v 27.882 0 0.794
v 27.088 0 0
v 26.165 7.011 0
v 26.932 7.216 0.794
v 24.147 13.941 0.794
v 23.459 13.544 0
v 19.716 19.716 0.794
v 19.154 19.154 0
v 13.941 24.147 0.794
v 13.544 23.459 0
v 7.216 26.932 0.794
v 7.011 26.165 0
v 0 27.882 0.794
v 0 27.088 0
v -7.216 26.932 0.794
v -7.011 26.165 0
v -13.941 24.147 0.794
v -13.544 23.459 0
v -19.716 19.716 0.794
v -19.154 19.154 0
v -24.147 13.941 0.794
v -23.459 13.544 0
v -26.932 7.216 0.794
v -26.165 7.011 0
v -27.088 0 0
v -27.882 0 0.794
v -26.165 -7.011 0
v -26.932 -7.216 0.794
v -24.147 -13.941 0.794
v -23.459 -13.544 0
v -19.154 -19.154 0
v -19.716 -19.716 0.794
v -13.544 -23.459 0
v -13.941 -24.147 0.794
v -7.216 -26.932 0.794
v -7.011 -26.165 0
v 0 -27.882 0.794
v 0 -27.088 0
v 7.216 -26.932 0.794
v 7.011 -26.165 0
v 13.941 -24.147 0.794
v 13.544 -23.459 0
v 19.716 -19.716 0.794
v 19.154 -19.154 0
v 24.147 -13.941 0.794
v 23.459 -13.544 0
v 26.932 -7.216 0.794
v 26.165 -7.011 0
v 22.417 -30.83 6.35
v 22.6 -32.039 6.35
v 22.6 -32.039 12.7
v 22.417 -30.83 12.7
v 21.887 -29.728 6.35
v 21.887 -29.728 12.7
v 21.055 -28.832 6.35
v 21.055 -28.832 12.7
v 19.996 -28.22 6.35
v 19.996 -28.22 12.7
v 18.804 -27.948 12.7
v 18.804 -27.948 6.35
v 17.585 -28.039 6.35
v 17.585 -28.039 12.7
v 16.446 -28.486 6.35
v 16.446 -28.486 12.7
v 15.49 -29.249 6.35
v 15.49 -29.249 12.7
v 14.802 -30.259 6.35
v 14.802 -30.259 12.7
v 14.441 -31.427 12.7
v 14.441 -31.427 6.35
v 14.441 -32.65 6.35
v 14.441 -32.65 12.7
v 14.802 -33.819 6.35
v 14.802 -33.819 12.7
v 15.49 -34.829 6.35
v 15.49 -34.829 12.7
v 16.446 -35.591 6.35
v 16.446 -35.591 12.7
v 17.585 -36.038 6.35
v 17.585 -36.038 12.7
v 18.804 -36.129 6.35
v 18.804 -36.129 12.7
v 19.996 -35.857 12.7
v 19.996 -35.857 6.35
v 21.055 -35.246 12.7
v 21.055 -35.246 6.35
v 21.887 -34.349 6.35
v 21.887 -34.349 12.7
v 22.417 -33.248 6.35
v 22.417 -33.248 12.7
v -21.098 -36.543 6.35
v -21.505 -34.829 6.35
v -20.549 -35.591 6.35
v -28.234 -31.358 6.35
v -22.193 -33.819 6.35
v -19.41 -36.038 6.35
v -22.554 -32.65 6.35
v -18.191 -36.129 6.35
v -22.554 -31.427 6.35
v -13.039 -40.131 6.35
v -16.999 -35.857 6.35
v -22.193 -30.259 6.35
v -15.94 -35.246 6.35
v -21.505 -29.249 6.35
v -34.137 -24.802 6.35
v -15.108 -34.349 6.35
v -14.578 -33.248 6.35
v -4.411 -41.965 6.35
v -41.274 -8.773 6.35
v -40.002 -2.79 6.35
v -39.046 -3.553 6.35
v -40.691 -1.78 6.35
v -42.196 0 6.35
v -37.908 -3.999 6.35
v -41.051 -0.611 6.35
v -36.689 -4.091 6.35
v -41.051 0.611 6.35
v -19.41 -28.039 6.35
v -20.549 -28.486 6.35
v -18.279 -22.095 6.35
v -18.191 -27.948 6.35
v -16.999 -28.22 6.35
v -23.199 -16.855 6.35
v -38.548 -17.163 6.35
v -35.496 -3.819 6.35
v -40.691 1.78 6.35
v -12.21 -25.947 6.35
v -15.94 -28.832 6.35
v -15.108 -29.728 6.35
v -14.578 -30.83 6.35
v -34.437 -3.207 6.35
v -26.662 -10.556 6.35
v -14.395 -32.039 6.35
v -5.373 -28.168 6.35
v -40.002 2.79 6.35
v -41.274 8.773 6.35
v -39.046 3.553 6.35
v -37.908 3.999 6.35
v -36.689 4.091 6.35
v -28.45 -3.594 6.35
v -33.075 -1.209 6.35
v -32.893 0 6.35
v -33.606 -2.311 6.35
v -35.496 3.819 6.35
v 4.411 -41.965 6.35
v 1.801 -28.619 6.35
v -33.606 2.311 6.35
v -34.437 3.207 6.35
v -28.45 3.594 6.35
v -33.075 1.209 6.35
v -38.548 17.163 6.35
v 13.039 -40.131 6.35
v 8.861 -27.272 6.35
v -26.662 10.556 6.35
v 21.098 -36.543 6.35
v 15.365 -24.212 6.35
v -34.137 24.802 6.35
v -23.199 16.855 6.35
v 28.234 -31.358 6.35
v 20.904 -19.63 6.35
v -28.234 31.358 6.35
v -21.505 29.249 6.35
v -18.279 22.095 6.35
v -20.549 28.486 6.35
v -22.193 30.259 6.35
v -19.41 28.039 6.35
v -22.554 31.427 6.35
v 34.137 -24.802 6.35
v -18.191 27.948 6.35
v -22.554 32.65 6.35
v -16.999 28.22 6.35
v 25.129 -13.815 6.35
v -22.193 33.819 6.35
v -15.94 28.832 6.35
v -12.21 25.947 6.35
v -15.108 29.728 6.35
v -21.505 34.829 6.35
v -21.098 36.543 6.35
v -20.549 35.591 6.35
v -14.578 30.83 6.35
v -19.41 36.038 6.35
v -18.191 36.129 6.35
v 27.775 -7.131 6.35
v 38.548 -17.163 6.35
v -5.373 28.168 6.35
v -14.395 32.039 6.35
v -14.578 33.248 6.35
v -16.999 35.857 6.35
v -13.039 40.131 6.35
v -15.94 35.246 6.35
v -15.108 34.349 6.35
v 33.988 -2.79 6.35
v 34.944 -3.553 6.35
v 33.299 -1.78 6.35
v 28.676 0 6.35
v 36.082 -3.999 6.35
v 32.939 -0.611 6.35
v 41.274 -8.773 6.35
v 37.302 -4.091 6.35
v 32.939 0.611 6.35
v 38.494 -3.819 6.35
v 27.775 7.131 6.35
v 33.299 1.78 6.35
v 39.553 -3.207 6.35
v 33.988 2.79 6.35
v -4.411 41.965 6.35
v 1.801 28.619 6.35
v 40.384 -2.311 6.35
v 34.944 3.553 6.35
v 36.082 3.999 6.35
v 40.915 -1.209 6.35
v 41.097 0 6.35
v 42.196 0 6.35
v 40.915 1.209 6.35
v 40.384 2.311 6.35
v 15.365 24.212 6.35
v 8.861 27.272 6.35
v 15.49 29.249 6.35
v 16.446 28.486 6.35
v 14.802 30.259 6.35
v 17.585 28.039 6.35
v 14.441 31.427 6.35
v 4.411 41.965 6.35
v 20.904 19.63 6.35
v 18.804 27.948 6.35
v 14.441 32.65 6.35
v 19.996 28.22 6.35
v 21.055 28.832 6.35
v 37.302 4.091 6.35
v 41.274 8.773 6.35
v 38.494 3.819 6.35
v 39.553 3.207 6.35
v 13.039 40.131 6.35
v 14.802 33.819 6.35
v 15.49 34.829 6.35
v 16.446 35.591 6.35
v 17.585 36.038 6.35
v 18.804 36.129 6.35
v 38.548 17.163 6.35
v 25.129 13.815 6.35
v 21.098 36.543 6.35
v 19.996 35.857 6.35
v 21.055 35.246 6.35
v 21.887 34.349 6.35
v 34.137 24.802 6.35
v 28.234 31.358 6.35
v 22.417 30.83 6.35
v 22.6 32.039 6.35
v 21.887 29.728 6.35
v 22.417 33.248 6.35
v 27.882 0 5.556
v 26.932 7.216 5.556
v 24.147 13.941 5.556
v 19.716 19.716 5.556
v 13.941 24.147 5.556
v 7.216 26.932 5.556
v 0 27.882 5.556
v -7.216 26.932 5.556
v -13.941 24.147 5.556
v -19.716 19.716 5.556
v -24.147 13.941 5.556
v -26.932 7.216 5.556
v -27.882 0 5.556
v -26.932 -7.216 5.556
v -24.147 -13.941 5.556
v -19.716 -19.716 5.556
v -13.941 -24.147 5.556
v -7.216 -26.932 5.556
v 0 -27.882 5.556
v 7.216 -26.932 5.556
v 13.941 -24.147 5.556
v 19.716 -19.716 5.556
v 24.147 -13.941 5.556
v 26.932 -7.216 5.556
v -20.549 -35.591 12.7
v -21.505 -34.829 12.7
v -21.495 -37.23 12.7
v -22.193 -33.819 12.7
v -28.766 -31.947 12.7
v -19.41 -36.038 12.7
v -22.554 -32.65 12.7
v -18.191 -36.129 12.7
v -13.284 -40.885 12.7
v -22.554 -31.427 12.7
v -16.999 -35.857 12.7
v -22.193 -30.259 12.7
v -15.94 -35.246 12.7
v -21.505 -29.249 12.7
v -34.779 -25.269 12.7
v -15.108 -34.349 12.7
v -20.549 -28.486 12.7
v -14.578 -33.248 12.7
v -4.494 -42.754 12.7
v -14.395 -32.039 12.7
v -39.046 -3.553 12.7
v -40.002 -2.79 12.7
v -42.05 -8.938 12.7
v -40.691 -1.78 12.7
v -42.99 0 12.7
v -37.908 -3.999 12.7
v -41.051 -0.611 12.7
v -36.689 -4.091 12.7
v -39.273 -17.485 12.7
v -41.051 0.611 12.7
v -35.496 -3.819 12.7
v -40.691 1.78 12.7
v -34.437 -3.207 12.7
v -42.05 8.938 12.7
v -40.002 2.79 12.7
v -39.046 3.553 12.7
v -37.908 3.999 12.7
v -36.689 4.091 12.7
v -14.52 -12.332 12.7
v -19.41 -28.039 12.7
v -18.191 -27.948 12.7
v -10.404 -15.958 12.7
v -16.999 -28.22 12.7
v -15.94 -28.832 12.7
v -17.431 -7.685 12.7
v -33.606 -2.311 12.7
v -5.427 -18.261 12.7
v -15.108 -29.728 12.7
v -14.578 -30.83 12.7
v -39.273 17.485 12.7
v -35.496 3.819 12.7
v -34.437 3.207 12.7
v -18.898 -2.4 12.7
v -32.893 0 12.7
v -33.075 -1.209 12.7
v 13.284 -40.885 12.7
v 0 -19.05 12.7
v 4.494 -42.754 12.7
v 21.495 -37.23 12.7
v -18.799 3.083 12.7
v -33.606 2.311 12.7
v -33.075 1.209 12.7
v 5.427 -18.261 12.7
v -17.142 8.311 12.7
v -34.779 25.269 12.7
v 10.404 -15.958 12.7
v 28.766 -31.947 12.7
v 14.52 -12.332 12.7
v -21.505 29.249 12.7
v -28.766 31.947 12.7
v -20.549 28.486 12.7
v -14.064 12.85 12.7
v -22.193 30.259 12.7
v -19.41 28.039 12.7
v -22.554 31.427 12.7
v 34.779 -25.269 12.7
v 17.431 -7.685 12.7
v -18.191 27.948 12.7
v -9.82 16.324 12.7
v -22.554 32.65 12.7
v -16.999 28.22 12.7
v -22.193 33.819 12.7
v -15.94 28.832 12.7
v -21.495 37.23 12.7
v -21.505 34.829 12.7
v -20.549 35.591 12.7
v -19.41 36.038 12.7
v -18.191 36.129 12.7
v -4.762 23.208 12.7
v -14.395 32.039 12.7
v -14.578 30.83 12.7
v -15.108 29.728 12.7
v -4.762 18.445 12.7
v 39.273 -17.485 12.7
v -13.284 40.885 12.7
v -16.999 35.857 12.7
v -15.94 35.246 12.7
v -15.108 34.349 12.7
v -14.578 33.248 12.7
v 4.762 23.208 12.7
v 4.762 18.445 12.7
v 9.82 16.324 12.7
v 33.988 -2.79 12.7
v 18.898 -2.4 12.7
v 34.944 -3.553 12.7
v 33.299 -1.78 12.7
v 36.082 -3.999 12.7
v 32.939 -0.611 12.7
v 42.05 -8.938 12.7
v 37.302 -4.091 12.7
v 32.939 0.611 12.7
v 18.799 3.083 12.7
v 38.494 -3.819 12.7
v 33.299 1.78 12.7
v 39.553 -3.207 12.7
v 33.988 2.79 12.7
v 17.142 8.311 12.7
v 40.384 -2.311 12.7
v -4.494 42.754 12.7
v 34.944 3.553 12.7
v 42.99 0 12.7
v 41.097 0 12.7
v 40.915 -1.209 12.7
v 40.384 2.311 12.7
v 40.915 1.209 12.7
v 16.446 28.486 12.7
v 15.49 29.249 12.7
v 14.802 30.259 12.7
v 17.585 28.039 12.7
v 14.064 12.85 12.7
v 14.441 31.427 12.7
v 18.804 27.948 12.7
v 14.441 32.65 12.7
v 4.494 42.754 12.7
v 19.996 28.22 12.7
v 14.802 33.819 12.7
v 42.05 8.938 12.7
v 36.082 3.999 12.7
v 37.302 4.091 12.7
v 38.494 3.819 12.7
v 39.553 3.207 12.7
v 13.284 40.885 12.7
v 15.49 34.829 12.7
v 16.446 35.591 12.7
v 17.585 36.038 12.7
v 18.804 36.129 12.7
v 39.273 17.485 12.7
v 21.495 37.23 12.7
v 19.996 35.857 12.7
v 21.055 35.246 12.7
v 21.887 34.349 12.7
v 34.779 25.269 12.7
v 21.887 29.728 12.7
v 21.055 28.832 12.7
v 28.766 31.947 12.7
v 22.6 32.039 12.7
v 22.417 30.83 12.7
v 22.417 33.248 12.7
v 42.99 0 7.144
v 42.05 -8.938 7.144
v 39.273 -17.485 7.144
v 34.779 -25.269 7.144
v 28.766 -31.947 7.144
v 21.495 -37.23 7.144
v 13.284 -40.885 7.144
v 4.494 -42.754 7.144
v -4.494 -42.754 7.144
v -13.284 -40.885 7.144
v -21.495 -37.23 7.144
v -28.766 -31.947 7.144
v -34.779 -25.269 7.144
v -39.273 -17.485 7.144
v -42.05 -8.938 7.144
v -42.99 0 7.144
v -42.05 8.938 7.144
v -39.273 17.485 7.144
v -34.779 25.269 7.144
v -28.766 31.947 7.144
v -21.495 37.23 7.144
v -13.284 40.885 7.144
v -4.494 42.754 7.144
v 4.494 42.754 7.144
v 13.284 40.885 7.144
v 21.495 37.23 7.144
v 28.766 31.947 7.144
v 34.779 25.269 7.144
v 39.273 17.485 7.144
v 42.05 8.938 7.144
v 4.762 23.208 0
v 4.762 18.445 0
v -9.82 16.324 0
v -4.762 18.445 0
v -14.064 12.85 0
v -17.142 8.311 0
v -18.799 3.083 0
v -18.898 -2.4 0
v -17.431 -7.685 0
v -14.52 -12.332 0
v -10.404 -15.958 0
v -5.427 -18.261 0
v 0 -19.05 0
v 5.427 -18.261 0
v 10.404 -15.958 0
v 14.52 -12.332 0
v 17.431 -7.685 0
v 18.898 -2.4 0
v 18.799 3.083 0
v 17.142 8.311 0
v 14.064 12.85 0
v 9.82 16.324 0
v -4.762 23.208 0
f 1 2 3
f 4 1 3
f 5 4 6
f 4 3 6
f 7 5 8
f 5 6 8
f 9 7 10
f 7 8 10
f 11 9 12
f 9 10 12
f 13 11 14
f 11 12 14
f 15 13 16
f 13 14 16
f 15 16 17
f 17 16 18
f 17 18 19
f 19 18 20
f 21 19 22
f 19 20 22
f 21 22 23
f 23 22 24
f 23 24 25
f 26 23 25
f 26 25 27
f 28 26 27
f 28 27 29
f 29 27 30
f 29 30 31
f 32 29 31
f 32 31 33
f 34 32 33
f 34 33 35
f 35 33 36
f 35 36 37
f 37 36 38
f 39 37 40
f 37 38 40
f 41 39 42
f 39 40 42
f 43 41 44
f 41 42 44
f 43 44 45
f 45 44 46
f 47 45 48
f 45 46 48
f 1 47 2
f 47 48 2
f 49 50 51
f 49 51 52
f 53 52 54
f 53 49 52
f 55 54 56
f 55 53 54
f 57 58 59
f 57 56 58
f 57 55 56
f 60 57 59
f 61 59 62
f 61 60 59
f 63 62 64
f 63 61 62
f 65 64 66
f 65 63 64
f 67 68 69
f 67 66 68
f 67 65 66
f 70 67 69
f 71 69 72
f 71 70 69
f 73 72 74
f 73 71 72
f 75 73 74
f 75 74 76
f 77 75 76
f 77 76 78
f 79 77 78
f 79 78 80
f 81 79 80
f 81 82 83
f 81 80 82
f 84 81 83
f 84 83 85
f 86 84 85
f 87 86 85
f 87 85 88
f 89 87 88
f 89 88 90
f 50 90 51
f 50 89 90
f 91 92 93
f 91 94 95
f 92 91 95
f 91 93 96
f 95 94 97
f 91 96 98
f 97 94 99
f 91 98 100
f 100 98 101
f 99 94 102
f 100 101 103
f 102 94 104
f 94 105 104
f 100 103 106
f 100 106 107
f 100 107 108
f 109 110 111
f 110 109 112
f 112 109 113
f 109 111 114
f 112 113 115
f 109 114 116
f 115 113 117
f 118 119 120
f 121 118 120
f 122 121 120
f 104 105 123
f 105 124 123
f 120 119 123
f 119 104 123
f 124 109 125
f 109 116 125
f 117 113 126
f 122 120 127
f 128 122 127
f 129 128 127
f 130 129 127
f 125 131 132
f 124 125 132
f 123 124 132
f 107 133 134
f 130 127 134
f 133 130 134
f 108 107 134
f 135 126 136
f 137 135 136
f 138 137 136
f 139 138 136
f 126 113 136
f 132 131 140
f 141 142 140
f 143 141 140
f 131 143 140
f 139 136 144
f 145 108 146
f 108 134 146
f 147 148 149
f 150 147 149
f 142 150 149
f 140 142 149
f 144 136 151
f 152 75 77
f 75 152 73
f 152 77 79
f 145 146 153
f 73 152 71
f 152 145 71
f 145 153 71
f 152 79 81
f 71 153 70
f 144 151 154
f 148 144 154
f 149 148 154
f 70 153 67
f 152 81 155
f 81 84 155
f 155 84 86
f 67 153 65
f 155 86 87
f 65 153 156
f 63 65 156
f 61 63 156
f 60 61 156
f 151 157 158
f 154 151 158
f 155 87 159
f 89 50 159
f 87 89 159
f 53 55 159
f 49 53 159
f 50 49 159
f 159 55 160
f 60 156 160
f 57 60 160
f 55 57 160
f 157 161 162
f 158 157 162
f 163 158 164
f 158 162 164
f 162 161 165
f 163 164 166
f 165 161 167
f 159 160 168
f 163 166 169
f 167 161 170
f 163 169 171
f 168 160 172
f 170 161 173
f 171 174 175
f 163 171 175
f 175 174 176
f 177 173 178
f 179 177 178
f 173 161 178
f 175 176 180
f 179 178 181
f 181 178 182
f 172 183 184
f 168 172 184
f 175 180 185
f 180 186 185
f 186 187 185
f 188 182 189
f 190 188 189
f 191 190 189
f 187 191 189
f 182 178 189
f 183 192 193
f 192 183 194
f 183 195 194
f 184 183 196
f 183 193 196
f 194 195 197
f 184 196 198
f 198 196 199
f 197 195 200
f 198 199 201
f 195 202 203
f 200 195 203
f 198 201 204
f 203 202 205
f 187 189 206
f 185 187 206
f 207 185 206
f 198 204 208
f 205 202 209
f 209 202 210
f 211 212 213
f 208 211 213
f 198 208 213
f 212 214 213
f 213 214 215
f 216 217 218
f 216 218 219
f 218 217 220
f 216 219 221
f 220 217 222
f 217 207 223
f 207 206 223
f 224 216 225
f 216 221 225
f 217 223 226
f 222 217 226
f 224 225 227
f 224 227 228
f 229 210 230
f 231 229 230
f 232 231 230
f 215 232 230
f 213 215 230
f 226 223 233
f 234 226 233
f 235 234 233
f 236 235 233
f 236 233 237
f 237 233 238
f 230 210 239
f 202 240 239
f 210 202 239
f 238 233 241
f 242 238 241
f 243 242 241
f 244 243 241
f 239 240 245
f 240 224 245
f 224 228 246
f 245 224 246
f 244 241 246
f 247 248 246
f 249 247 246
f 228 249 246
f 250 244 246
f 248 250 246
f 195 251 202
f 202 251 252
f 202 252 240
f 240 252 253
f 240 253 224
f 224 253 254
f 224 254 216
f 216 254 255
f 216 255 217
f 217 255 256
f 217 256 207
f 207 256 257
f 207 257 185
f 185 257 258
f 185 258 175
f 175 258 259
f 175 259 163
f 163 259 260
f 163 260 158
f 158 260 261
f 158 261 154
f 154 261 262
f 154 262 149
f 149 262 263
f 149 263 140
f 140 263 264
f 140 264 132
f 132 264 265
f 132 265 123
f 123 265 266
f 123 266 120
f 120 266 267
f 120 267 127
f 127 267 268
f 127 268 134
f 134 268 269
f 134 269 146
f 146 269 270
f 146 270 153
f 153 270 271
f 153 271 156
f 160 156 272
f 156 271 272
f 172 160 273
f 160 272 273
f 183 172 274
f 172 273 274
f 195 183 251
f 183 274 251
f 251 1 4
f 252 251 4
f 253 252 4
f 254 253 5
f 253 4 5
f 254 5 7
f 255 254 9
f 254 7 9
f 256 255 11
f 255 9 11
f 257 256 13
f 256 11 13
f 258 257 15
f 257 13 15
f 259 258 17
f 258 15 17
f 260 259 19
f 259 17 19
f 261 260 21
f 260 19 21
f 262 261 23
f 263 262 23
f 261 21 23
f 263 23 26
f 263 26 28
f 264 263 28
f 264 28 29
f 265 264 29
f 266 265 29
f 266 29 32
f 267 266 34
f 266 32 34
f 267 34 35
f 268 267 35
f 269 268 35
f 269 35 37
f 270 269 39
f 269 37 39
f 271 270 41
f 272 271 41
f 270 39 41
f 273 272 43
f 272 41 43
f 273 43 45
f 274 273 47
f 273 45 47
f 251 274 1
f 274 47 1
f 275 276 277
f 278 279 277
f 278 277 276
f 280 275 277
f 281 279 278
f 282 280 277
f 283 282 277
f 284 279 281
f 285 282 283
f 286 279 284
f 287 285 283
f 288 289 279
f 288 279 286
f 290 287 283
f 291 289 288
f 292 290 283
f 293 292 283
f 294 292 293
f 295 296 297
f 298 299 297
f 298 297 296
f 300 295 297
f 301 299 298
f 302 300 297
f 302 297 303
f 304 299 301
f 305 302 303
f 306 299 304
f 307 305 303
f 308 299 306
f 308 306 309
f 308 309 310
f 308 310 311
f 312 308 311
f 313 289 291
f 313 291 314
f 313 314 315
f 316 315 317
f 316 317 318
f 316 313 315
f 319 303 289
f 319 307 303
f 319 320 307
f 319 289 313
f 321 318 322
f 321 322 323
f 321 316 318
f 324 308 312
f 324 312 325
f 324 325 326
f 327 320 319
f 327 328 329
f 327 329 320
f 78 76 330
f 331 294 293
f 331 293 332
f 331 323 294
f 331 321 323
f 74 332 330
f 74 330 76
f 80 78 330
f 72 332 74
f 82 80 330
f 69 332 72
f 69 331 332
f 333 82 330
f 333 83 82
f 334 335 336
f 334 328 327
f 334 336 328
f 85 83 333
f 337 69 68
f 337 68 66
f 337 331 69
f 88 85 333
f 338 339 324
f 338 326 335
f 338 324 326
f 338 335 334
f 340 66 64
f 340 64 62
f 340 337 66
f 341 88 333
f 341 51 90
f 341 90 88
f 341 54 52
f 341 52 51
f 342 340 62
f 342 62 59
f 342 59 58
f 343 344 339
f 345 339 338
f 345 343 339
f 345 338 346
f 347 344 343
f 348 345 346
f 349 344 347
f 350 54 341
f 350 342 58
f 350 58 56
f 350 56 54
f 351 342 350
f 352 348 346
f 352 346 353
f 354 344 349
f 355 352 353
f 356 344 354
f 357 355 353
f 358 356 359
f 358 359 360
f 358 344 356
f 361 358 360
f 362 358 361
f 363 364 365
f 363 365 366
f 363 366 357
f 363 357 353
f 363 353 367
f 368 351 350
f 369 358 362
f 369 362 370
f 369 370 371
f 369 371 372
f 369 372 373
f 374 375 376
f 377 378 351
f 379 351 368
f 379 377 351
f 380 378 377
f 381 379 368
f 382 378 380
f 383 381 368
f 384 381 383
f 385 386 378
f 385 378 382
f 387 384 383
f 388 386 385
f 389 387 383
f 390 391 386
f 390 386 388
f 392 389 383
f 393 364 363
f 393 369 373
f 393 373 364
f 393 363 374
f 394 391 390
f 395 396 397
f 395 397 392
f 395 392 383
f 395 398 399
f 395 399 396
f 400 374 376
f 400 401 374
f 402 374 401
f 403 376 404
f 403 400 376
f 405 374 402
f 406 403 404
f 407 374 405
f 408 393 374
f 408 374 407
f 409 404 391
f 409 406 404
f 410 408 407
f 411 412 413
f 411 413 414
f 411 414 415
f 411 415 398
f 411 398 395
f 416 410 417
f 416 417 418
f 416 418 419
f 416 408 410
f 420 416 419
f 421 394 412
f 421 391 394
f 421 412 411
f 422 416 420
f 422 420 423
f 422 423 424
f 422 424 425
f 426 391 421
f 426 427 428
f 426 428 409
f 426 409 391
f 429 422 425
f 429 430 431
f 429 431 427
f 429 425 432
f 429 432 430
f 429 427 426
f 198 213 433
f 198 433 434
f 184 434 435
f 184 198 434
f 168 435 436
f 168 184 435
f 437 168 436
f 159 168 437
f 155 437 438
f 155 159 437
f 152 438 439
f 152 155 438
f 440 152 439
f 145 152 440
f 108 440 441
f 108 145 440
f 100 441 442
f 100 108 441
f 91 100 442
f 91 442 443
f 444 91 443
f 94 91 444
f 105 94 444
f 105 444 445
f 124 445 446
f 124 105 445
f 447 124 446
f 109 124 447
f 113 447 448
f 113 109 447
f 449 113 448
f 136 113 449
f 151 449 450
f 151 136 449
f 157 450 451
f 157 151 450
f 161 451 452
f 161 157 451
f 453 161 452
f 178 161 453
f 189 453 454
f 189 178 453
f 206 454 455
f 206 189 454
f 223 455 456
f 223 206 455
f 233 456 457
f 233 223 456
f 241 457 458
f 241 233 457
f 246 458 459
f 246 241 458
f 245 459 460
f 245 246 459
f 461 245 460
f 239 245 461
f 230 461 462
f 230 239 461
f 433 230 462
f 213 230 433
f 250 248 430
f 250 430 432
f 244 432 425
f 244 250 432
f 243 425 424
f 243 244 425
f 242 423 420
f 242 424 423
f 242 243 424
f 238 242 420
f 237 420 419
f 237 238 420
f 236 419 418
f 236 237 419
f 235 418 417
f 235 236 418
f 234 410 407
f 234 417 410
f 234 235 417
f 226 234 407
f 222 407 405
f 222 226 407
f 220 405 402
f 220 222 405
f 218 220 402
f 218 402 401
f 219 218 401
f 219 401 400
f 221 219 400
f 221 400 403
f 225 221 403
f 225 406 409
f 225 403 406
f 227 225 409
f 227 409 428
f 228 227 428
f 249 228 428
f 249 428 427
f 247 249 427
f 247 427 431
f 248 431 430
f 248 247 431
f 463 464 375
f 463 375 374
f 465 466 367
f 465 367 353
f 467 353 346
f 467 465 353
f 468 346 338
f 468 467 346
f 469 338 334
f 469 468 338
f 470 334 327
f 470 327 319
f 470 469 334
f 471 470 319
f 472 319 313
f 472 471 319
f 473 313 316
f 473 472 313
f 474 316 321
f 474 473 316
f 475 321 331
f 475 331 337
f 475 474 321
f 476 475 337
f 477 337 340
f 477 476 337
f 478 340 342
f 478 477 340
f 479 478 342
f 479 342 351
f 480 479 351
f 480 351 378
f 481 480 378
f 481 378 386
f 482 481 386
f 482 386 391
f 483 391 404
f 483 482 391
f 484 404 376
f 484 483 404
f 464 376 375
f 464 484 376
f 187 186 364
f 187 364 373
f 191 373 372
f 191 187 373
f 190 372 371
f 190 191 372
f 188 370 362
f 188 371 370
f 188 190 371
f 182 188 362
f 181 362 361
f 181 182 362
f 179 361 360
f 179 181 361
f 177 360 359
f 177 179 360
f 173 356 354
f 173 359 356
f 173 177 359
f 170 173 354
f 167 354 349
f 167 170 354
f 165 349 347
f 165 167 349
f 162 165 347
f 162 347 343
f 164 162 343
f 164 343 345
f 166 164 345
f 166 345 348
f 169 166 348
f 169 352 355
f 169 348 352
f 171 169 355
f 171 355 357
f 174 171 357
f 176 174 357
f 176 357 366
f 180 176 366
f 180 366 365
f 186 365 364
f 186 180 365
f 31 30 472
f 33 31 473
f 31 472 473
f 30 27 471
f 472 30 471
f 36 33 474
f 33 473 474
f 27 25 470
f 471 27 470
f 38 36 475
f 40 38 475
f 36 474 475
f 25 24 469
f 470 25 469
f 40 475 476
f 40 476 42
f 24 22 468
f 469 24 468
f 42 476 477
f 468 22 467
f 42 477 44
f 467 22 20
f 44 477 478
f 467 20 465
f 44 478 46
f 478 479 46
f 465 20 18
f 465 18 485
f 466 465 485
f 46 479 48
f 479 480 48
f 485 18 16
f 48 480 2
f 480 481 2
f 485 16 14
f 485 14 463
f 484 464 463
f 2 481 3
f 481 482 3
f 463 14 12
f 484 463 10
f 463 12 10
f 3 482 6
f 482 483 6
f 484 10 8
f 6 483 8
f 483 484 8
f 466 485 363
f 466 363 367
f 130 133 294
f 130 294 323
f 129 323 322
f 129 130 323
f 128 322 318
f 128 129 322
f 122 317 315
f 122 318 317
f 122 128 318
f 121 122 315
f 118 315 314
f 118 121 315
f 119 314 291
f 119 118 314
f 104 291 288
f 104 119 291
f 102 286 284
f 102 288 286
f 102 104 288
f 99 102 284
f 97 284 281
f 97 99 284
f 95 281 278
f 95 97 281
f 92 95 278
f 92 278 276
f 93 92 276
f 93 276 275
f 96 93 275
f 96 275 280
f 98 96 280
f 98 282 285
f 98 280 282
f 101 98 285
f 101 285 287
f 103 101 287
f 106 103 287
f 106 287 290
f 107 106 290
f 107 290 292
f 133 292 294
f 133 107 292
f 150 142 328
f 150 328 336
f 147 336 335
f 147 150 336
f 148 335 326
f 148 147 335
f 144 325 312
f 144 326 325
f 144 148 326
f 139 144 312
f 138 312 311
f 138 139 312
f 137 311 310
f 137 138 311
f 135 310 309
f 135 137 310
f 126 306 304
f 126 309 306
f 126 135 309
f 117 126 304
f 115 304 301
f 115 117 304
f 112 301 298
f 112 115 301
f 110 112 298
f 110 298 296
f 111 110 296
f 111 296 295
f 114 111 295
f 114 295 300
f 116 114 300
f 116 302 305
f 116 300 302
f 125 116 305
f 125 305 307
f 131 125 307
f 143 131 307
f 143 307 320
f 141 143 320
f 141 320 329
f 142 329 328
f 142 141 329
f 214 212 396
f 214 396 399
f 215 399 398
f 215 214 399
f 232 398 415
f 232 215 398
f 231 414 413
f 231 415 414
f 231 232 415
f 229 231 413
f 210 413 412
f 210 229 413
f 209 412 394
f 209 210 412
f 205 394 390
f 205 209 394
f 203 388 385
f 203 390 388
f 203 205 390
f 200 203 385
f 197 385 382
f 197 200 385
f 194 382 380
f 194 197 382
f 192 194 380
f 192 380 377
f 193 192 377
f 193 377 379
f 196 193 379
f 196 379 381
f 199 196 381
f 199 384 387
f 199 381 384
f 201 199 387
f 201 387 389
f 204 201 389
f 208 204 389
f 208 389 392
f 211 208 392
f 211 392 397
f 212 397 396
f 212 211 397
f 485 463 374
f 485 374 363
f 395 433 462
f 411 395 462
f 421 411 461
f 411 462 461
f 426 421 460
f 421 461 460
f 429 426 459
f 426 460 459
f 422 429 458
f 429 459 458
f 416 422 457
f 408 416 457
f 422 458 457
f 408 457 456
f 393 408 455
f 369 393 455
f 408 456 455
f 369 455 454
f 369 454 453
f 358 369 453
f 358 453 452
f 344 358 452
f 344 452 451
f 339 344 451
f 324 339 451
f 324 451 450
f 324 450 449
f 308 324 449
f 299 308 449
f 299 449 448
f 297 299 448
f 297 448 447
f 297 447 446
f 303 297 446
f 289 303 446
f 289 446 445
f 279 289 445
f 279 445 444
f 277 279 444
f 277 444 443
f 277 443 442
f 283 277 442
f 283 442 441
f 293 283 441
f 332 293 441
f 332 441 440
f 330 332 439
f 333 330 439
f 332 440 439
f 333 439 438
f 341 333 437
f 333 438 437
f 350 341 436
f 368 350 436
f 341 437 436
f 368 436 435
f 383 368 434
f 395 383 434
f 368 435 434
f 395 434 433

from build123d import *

# Parameters (mm, degrees)
SKETCH1_R           = 42.9895
BOSS_EXTRUDE1_DEPTH = 12.7
SKETCH2_R           = 4.1021
CUT_EXTRUDE1_DEPTH  = 13.7
SKETCH3_OUTSIDE_W   = 112.43
SKETCH3_OUTSIDE_H   = 112.43
SKETCH3_OUTSIDE_R   = 27.882207728
CUT_EXTRUDE2_DEPTH  = 6.35
CHAMFER1_SIZE       = 0.79375
CHAMFER2_SIZE       = 0.79375


with BuildPart() as part:
    # Sketch1 → Boss-Extrude1 (new body)
    with BuildSketch(Plane.XY):
        Circle(SKETCH1_R)
        with BuildLine():
            Line((-4.7625, 23.207583186), (-4.7625, 18.445083186))
            ThreePointArc((-4.7625, 18.445083186), (0, -19.05), (4.7625, 18.445083186))
            Line((4.7625, 18.445083186), (4.7625, 23.207583186))
            Line((4.7625, 23.207583186), (-4.7625, 23.207583186))
        make_face(mode=Mode.SUBTRACT)
    extrude(amount=BOSS_EXTRUDE1_DEPTH)

    # Sketch2 → Cut-Extrude1 (cut, through all)
    with BuildSketch(Plane.XY):
        with Locations((36.9951, 0)):
            Circle(SKETCH2_R)
        with Locations((18.49755, -32.038696425)):
            Circle(SKETCH2_R)
        with Locations((-18.49755, -32.038696425)):
            Circle(SKETCH2_R)
        with Locations((-36.9951, 0)):
            Circle(SKETCH2_R)
        with Locations((-18.49755, 32.038696425)):
            Circle(SKETCH2_R)
        with Locations((18.49755, 32.038696425)):
            Circle(SKETCH2_R)
    extrude(amount=CUT_EXTRUDE1_DEPTH, mode=Mode.SUBTRACT)

    # Sketch3 outside → Cut-Extrude2 (cut)
    with BuildSketch(Plane.XY):
        Rectangle(SKETCH3_OUTSIDE_W, SKETCH3_OUTSIDE_H)
        Circle(SKETCH3_OUTSIDE_R, mode=Mode.SUBTRACT)
    extrude(amount=CUT_EXTRUDE2_DEPTH, mode=Mode.SUBTRACT)

    # Chamfer1
    chamfer1_edges = [part.edges().sort_by_distance(p)[0] for p in [
        (-42.9895, 0, 6.35),
        (-27.882207728, 0, 0),
    ]]
    chamfer(chamfer1_edges, length=CHAMFER1_SIZE)

    # Chamfer2
    chamfer2_edges = [part.edges().sort_by_distance(p)[0] for p in [
        (-27.882207728, 0, 6.35),
    ]]
    chamfer(chamfer2_edges, length=CHAMFER2_SIZE)


solid = part.part
